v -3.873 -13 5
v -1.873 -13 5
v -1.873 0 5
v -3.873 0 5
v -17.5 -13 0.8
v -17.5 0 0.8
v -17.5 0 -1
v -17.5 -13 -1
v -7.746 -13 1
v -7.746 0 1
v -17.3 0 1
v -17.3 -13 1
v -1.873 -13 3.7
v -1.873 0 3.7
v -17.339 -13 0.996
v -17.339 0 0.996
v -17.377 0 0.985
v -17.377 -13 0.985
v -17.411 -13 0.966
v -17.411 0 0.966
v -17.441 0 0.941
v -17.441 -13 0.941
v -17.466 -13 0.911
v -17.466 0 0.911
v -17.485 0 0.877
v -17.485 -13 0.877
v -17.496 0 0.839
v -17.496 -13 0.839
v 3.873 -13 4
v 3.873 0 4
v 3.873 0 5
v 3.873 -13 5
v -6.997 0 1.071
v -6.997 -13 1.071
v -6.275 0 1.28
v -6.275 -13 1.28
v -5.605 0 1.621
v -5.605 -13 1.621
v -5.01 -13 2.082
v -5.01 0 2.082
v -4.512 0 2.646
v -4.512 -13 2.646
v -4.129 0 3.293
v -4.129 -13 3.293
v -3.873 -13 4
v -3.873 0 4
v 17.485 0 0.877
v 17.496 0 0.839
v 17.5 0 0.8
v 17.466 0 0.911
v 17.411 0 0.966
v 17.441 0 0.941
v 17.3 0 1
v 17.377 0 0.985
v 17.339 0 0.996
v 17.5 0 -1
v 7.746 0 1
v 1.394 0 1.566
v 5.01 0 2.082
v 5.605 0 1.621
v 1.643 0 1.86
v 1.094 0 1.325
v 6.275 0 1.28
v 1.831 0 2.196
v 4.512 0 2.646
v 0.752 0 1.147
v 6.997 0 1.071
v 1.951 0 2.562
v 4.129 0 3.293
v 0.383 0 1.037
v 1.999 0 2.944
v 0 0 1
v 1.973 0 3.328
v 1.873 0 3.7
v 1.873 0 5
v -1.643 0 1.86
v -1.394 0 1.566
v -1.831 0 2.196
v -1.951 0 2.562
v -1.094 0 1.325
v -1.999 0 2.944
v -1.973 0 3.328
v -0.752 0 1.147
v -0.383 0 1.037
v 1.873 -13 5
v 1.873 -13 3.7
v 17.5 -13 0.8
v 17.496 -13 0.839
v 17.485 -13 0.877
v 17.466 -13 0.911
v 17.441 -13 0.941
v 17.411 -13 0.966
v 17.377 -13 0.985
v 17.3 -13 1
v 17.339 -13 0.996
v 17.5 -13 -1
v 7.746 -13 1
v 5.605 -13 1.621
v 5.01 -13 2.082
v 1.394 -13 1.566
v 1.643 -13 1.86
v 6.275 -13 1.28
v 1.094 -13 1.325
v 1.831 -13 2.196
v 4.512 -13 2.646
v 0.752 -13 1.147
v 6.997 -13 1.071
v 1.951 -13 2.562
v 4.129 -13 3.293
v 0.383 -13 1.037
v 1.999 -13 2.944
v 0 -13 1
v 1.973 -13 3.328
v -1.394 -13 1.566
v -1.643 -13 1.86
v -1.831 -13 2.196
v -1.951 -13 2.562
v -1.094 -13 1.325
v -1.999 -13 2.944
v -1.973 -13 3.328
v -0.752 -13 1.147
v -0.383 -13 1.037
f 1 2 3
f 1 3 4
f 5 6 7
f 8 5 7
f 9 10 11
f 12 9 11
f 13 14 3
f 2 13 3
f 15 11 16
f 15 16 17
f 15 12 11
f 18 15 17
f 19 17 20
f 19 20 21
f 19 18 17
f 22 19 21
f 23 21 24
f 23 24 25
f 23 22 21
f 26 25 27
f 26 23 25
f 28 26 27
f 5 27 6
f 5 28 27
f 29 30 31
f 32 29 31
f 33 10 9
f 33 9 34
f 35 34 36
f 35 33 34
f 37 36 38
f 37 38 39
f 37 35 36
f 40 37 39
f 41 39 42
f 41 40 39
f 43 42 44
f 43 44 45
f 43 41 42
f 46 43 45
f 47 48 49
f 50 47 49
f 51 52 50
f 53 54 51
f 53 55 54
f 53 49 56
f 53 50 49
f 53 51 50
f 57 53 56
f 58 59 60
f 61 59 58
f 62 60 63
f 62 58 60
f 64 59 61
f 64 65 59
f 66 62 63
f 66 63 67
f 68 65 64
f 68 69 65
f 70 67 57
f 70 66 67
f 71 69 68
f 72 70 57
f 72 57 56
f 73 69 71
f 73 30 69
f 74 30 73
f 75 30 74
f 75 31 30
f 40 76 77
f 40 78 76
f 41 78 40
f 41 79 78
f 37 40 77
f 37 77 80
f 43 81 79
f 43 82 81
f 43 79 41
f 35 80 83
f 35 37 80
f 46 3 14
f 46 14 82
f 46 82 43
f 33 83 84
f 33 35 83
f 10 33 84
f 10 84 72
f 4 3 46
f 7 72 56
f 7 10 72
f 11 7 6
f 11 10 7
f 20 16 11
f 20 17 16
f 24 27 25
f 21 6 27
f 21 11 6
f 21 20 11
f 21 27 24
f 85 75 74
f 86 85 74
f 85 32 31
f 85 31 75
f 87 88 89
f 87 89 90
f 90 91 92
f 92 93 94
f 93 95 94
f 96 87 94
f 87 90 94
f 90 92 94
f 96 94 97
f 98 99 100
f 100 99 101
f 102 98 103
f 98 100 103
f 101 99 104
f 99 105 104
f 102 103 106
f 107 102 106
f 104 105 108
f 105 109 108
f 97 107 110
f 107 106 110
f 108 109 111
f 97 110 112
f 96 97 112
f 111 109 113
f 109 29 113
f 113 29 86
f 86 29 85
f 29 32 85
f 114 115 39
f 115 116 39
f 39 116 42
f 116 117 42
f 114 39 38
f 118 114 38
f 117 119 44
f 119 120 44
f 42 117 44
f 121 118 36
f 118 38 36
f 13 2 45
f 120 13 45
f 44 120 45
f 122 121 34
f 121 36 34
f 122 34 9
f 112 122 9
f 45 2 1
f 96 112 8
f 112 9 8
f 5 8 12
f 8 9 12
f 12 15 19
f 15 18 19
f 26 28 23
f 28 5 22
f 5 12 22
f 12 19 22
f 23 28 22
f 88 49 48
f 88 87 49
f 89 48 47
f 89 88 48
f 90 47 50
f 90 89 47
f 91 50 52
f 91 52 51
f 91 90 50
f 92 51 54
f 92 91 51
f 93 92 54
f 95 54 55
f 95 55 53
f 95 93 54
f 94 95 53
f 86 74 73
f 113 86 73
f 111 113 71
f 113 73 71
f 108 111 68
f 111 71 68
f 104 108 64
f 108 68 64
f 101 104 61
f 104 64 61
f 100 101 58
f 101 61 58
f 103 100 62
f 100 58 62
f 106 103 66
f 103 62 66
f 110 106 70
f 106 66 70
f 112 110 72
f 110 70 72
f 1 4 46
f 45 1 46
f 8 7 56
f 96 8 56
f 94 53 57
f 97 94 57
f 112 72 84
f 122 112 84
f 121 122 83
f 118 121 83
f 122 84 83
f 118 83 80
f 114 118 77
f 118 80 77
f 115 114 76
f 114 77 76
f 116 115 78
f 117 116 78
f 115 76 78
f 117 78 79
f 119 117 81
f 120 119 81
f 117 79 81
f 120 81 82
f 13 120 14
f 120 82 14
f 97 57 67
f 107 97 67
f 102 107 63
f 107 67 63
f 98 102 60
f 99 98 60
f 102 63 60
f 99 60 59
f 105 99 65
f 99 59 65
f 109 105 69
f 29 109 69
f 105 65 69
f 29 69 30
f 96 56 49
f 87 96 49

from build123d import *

# Parameters (mm, degrees)
F1_DEPTH    = 13
F2_T1_DEPTH = 13
F3_R        = 0.2


# Not quite as in the source:
# - a fillet or chamfer that OpenCascade refuses, or shapes differently, is made with other operations: its cross-section is extruded or revolved along the edge and cut away or added
# - a feature names something its author has since deleted; it is built from what else it names


with BuildPart() as f1:
    # F0 (on Front) → F1 (new body)
    with BuildSketch(Plane.XZ):
        with BuildLine():
            Line((-3.4641016151, 1), (-17.5, 1))
            Line((-17.5, 1), (-17.5, -1))
            Line((-17.5, -1), (0, -1))
            ThreePointArc((0, -1), (-2, -0.4641016151), (-3.4641016151, 1))
        make_face()
        with BuildLine():
            ThreePointArc((-3.9382737335, 3.7), (-3.9397068673, 2.3081114255), (-3.4641016151, 1))
            Line((-3.4641016151, 1), (7e-09, 1))
            ThreePointArc((7e-09, 1), (-1.6431676705, 1.859824572), (-1.8734993995, 3.7))
            Line((-1.8734993995, 3.7), (-3.9382737335, 3.7))
        make_face()
        with BuildLine():
            Line((7e-09, 1), (-3.4641016151, 1))
            ThreePointArc((-3.4641016151, 1), (-2, -0.4641016151), (0, -1))
            ThreePointArc((0, -1), (2, -0.4641016151), (3.4641016151, 1))
            Line((3.4641016151, 1), (7e-09, 1))
        make_face()
        with BuildLine():
            ThreePointArc((1.8734993995, 3.7), (1.6431676745, 1.8598245778), (7e-09, 1))
            Line((7e-09, 1), (3.4641016151, 1))
            ThreePointArc((3.4641016151, 1), (3.9397068673, 2.3081114255), (3.9382737335, 3.7))
            Line((3.9382737335, 3.7), (1.8734993995, 3.7))
        make_face()
        with BuildLine():
            ThreePointArc((-3.8729833462, 4), (-3.9085079367, 3.8506266565), (-3.9382737335, 3.7))
            Line((-3.9382737335, 3.7), (-1.8734993995, 3.7))
            Line((-1.8734993995, 3.7), (-1.8734993995, 5))
            Line((-1.8734993995, 5), (-3.8729833462, 5))
            Line((-3.8729833462, 5), (-3.8729833462, 4))
        make_face()
        with BuildLine():
            ThreePointArc((3.4641016151, 1), (2, -0.4641016151), (0, -1))
            Line((0, -1), (17.5, -1))
            Line((17.5, -1), (17.5, 1))
            Line((17.5, 1), (3.4641016151, 1))
        make_face()
        with BuildLine():
            Line((1.8734993995, 5), (1.8734993995, 3.7))
            Line((1.8734993995, 3.7), (3.9382737335, 3.7))
            ThreePointArc((3.9382737335, 3.7), (3.9085079367, 3.8506266565), (3.8729833462, 4))
            Line((3.8729833462, 4), (3.8729833462, 5))
            Line((3.8729833462, 5), (1.8734993995, 5))
        make_face()
    extrude(amount=F1_DEPTH)

    # F2: fillet of radius 4 on 2 edges, made by hand

    # F2_s2 → F2_t1 (join)
    with BuildSketch(Plane.XZ):
        with BuildLine():
            ThreePointArc((-7.7459666924, 1), (-5.2964769496, 1.8377223398), (-3.8729833462, 4))
            ThreePointArc((-3.8729833462, 4), (-3.9633576589, 2.4598184865), (-3.4641016151, 1))
            Line((-3.4641016151, 1), (-7.7459666924, 1))
        make_face()
        with BuildLine():
            ThreePointArc((7.7459666924, 1), (5.2964769496, 1.8377223398), (3.8729833462, 4))
            ThreePointArc((3.8729833462, 4), (3.9633576589, 2.4598184865), (3.4641016151, 1))
            Line((3.4641016151, 1), (7.7459666924, 1))
        make_face()
    extrude(amount=F2_T1_DEPTH)

    # F3
    f3_edges = [f1.edges().sort_by_distance(p)[0] for p in [
        (-17.5, -6.5, 1),
        (17.5, -6.5, 1),
    ]]
    fillet(f3_edges, radius=F3_R)


solid = f1.part
